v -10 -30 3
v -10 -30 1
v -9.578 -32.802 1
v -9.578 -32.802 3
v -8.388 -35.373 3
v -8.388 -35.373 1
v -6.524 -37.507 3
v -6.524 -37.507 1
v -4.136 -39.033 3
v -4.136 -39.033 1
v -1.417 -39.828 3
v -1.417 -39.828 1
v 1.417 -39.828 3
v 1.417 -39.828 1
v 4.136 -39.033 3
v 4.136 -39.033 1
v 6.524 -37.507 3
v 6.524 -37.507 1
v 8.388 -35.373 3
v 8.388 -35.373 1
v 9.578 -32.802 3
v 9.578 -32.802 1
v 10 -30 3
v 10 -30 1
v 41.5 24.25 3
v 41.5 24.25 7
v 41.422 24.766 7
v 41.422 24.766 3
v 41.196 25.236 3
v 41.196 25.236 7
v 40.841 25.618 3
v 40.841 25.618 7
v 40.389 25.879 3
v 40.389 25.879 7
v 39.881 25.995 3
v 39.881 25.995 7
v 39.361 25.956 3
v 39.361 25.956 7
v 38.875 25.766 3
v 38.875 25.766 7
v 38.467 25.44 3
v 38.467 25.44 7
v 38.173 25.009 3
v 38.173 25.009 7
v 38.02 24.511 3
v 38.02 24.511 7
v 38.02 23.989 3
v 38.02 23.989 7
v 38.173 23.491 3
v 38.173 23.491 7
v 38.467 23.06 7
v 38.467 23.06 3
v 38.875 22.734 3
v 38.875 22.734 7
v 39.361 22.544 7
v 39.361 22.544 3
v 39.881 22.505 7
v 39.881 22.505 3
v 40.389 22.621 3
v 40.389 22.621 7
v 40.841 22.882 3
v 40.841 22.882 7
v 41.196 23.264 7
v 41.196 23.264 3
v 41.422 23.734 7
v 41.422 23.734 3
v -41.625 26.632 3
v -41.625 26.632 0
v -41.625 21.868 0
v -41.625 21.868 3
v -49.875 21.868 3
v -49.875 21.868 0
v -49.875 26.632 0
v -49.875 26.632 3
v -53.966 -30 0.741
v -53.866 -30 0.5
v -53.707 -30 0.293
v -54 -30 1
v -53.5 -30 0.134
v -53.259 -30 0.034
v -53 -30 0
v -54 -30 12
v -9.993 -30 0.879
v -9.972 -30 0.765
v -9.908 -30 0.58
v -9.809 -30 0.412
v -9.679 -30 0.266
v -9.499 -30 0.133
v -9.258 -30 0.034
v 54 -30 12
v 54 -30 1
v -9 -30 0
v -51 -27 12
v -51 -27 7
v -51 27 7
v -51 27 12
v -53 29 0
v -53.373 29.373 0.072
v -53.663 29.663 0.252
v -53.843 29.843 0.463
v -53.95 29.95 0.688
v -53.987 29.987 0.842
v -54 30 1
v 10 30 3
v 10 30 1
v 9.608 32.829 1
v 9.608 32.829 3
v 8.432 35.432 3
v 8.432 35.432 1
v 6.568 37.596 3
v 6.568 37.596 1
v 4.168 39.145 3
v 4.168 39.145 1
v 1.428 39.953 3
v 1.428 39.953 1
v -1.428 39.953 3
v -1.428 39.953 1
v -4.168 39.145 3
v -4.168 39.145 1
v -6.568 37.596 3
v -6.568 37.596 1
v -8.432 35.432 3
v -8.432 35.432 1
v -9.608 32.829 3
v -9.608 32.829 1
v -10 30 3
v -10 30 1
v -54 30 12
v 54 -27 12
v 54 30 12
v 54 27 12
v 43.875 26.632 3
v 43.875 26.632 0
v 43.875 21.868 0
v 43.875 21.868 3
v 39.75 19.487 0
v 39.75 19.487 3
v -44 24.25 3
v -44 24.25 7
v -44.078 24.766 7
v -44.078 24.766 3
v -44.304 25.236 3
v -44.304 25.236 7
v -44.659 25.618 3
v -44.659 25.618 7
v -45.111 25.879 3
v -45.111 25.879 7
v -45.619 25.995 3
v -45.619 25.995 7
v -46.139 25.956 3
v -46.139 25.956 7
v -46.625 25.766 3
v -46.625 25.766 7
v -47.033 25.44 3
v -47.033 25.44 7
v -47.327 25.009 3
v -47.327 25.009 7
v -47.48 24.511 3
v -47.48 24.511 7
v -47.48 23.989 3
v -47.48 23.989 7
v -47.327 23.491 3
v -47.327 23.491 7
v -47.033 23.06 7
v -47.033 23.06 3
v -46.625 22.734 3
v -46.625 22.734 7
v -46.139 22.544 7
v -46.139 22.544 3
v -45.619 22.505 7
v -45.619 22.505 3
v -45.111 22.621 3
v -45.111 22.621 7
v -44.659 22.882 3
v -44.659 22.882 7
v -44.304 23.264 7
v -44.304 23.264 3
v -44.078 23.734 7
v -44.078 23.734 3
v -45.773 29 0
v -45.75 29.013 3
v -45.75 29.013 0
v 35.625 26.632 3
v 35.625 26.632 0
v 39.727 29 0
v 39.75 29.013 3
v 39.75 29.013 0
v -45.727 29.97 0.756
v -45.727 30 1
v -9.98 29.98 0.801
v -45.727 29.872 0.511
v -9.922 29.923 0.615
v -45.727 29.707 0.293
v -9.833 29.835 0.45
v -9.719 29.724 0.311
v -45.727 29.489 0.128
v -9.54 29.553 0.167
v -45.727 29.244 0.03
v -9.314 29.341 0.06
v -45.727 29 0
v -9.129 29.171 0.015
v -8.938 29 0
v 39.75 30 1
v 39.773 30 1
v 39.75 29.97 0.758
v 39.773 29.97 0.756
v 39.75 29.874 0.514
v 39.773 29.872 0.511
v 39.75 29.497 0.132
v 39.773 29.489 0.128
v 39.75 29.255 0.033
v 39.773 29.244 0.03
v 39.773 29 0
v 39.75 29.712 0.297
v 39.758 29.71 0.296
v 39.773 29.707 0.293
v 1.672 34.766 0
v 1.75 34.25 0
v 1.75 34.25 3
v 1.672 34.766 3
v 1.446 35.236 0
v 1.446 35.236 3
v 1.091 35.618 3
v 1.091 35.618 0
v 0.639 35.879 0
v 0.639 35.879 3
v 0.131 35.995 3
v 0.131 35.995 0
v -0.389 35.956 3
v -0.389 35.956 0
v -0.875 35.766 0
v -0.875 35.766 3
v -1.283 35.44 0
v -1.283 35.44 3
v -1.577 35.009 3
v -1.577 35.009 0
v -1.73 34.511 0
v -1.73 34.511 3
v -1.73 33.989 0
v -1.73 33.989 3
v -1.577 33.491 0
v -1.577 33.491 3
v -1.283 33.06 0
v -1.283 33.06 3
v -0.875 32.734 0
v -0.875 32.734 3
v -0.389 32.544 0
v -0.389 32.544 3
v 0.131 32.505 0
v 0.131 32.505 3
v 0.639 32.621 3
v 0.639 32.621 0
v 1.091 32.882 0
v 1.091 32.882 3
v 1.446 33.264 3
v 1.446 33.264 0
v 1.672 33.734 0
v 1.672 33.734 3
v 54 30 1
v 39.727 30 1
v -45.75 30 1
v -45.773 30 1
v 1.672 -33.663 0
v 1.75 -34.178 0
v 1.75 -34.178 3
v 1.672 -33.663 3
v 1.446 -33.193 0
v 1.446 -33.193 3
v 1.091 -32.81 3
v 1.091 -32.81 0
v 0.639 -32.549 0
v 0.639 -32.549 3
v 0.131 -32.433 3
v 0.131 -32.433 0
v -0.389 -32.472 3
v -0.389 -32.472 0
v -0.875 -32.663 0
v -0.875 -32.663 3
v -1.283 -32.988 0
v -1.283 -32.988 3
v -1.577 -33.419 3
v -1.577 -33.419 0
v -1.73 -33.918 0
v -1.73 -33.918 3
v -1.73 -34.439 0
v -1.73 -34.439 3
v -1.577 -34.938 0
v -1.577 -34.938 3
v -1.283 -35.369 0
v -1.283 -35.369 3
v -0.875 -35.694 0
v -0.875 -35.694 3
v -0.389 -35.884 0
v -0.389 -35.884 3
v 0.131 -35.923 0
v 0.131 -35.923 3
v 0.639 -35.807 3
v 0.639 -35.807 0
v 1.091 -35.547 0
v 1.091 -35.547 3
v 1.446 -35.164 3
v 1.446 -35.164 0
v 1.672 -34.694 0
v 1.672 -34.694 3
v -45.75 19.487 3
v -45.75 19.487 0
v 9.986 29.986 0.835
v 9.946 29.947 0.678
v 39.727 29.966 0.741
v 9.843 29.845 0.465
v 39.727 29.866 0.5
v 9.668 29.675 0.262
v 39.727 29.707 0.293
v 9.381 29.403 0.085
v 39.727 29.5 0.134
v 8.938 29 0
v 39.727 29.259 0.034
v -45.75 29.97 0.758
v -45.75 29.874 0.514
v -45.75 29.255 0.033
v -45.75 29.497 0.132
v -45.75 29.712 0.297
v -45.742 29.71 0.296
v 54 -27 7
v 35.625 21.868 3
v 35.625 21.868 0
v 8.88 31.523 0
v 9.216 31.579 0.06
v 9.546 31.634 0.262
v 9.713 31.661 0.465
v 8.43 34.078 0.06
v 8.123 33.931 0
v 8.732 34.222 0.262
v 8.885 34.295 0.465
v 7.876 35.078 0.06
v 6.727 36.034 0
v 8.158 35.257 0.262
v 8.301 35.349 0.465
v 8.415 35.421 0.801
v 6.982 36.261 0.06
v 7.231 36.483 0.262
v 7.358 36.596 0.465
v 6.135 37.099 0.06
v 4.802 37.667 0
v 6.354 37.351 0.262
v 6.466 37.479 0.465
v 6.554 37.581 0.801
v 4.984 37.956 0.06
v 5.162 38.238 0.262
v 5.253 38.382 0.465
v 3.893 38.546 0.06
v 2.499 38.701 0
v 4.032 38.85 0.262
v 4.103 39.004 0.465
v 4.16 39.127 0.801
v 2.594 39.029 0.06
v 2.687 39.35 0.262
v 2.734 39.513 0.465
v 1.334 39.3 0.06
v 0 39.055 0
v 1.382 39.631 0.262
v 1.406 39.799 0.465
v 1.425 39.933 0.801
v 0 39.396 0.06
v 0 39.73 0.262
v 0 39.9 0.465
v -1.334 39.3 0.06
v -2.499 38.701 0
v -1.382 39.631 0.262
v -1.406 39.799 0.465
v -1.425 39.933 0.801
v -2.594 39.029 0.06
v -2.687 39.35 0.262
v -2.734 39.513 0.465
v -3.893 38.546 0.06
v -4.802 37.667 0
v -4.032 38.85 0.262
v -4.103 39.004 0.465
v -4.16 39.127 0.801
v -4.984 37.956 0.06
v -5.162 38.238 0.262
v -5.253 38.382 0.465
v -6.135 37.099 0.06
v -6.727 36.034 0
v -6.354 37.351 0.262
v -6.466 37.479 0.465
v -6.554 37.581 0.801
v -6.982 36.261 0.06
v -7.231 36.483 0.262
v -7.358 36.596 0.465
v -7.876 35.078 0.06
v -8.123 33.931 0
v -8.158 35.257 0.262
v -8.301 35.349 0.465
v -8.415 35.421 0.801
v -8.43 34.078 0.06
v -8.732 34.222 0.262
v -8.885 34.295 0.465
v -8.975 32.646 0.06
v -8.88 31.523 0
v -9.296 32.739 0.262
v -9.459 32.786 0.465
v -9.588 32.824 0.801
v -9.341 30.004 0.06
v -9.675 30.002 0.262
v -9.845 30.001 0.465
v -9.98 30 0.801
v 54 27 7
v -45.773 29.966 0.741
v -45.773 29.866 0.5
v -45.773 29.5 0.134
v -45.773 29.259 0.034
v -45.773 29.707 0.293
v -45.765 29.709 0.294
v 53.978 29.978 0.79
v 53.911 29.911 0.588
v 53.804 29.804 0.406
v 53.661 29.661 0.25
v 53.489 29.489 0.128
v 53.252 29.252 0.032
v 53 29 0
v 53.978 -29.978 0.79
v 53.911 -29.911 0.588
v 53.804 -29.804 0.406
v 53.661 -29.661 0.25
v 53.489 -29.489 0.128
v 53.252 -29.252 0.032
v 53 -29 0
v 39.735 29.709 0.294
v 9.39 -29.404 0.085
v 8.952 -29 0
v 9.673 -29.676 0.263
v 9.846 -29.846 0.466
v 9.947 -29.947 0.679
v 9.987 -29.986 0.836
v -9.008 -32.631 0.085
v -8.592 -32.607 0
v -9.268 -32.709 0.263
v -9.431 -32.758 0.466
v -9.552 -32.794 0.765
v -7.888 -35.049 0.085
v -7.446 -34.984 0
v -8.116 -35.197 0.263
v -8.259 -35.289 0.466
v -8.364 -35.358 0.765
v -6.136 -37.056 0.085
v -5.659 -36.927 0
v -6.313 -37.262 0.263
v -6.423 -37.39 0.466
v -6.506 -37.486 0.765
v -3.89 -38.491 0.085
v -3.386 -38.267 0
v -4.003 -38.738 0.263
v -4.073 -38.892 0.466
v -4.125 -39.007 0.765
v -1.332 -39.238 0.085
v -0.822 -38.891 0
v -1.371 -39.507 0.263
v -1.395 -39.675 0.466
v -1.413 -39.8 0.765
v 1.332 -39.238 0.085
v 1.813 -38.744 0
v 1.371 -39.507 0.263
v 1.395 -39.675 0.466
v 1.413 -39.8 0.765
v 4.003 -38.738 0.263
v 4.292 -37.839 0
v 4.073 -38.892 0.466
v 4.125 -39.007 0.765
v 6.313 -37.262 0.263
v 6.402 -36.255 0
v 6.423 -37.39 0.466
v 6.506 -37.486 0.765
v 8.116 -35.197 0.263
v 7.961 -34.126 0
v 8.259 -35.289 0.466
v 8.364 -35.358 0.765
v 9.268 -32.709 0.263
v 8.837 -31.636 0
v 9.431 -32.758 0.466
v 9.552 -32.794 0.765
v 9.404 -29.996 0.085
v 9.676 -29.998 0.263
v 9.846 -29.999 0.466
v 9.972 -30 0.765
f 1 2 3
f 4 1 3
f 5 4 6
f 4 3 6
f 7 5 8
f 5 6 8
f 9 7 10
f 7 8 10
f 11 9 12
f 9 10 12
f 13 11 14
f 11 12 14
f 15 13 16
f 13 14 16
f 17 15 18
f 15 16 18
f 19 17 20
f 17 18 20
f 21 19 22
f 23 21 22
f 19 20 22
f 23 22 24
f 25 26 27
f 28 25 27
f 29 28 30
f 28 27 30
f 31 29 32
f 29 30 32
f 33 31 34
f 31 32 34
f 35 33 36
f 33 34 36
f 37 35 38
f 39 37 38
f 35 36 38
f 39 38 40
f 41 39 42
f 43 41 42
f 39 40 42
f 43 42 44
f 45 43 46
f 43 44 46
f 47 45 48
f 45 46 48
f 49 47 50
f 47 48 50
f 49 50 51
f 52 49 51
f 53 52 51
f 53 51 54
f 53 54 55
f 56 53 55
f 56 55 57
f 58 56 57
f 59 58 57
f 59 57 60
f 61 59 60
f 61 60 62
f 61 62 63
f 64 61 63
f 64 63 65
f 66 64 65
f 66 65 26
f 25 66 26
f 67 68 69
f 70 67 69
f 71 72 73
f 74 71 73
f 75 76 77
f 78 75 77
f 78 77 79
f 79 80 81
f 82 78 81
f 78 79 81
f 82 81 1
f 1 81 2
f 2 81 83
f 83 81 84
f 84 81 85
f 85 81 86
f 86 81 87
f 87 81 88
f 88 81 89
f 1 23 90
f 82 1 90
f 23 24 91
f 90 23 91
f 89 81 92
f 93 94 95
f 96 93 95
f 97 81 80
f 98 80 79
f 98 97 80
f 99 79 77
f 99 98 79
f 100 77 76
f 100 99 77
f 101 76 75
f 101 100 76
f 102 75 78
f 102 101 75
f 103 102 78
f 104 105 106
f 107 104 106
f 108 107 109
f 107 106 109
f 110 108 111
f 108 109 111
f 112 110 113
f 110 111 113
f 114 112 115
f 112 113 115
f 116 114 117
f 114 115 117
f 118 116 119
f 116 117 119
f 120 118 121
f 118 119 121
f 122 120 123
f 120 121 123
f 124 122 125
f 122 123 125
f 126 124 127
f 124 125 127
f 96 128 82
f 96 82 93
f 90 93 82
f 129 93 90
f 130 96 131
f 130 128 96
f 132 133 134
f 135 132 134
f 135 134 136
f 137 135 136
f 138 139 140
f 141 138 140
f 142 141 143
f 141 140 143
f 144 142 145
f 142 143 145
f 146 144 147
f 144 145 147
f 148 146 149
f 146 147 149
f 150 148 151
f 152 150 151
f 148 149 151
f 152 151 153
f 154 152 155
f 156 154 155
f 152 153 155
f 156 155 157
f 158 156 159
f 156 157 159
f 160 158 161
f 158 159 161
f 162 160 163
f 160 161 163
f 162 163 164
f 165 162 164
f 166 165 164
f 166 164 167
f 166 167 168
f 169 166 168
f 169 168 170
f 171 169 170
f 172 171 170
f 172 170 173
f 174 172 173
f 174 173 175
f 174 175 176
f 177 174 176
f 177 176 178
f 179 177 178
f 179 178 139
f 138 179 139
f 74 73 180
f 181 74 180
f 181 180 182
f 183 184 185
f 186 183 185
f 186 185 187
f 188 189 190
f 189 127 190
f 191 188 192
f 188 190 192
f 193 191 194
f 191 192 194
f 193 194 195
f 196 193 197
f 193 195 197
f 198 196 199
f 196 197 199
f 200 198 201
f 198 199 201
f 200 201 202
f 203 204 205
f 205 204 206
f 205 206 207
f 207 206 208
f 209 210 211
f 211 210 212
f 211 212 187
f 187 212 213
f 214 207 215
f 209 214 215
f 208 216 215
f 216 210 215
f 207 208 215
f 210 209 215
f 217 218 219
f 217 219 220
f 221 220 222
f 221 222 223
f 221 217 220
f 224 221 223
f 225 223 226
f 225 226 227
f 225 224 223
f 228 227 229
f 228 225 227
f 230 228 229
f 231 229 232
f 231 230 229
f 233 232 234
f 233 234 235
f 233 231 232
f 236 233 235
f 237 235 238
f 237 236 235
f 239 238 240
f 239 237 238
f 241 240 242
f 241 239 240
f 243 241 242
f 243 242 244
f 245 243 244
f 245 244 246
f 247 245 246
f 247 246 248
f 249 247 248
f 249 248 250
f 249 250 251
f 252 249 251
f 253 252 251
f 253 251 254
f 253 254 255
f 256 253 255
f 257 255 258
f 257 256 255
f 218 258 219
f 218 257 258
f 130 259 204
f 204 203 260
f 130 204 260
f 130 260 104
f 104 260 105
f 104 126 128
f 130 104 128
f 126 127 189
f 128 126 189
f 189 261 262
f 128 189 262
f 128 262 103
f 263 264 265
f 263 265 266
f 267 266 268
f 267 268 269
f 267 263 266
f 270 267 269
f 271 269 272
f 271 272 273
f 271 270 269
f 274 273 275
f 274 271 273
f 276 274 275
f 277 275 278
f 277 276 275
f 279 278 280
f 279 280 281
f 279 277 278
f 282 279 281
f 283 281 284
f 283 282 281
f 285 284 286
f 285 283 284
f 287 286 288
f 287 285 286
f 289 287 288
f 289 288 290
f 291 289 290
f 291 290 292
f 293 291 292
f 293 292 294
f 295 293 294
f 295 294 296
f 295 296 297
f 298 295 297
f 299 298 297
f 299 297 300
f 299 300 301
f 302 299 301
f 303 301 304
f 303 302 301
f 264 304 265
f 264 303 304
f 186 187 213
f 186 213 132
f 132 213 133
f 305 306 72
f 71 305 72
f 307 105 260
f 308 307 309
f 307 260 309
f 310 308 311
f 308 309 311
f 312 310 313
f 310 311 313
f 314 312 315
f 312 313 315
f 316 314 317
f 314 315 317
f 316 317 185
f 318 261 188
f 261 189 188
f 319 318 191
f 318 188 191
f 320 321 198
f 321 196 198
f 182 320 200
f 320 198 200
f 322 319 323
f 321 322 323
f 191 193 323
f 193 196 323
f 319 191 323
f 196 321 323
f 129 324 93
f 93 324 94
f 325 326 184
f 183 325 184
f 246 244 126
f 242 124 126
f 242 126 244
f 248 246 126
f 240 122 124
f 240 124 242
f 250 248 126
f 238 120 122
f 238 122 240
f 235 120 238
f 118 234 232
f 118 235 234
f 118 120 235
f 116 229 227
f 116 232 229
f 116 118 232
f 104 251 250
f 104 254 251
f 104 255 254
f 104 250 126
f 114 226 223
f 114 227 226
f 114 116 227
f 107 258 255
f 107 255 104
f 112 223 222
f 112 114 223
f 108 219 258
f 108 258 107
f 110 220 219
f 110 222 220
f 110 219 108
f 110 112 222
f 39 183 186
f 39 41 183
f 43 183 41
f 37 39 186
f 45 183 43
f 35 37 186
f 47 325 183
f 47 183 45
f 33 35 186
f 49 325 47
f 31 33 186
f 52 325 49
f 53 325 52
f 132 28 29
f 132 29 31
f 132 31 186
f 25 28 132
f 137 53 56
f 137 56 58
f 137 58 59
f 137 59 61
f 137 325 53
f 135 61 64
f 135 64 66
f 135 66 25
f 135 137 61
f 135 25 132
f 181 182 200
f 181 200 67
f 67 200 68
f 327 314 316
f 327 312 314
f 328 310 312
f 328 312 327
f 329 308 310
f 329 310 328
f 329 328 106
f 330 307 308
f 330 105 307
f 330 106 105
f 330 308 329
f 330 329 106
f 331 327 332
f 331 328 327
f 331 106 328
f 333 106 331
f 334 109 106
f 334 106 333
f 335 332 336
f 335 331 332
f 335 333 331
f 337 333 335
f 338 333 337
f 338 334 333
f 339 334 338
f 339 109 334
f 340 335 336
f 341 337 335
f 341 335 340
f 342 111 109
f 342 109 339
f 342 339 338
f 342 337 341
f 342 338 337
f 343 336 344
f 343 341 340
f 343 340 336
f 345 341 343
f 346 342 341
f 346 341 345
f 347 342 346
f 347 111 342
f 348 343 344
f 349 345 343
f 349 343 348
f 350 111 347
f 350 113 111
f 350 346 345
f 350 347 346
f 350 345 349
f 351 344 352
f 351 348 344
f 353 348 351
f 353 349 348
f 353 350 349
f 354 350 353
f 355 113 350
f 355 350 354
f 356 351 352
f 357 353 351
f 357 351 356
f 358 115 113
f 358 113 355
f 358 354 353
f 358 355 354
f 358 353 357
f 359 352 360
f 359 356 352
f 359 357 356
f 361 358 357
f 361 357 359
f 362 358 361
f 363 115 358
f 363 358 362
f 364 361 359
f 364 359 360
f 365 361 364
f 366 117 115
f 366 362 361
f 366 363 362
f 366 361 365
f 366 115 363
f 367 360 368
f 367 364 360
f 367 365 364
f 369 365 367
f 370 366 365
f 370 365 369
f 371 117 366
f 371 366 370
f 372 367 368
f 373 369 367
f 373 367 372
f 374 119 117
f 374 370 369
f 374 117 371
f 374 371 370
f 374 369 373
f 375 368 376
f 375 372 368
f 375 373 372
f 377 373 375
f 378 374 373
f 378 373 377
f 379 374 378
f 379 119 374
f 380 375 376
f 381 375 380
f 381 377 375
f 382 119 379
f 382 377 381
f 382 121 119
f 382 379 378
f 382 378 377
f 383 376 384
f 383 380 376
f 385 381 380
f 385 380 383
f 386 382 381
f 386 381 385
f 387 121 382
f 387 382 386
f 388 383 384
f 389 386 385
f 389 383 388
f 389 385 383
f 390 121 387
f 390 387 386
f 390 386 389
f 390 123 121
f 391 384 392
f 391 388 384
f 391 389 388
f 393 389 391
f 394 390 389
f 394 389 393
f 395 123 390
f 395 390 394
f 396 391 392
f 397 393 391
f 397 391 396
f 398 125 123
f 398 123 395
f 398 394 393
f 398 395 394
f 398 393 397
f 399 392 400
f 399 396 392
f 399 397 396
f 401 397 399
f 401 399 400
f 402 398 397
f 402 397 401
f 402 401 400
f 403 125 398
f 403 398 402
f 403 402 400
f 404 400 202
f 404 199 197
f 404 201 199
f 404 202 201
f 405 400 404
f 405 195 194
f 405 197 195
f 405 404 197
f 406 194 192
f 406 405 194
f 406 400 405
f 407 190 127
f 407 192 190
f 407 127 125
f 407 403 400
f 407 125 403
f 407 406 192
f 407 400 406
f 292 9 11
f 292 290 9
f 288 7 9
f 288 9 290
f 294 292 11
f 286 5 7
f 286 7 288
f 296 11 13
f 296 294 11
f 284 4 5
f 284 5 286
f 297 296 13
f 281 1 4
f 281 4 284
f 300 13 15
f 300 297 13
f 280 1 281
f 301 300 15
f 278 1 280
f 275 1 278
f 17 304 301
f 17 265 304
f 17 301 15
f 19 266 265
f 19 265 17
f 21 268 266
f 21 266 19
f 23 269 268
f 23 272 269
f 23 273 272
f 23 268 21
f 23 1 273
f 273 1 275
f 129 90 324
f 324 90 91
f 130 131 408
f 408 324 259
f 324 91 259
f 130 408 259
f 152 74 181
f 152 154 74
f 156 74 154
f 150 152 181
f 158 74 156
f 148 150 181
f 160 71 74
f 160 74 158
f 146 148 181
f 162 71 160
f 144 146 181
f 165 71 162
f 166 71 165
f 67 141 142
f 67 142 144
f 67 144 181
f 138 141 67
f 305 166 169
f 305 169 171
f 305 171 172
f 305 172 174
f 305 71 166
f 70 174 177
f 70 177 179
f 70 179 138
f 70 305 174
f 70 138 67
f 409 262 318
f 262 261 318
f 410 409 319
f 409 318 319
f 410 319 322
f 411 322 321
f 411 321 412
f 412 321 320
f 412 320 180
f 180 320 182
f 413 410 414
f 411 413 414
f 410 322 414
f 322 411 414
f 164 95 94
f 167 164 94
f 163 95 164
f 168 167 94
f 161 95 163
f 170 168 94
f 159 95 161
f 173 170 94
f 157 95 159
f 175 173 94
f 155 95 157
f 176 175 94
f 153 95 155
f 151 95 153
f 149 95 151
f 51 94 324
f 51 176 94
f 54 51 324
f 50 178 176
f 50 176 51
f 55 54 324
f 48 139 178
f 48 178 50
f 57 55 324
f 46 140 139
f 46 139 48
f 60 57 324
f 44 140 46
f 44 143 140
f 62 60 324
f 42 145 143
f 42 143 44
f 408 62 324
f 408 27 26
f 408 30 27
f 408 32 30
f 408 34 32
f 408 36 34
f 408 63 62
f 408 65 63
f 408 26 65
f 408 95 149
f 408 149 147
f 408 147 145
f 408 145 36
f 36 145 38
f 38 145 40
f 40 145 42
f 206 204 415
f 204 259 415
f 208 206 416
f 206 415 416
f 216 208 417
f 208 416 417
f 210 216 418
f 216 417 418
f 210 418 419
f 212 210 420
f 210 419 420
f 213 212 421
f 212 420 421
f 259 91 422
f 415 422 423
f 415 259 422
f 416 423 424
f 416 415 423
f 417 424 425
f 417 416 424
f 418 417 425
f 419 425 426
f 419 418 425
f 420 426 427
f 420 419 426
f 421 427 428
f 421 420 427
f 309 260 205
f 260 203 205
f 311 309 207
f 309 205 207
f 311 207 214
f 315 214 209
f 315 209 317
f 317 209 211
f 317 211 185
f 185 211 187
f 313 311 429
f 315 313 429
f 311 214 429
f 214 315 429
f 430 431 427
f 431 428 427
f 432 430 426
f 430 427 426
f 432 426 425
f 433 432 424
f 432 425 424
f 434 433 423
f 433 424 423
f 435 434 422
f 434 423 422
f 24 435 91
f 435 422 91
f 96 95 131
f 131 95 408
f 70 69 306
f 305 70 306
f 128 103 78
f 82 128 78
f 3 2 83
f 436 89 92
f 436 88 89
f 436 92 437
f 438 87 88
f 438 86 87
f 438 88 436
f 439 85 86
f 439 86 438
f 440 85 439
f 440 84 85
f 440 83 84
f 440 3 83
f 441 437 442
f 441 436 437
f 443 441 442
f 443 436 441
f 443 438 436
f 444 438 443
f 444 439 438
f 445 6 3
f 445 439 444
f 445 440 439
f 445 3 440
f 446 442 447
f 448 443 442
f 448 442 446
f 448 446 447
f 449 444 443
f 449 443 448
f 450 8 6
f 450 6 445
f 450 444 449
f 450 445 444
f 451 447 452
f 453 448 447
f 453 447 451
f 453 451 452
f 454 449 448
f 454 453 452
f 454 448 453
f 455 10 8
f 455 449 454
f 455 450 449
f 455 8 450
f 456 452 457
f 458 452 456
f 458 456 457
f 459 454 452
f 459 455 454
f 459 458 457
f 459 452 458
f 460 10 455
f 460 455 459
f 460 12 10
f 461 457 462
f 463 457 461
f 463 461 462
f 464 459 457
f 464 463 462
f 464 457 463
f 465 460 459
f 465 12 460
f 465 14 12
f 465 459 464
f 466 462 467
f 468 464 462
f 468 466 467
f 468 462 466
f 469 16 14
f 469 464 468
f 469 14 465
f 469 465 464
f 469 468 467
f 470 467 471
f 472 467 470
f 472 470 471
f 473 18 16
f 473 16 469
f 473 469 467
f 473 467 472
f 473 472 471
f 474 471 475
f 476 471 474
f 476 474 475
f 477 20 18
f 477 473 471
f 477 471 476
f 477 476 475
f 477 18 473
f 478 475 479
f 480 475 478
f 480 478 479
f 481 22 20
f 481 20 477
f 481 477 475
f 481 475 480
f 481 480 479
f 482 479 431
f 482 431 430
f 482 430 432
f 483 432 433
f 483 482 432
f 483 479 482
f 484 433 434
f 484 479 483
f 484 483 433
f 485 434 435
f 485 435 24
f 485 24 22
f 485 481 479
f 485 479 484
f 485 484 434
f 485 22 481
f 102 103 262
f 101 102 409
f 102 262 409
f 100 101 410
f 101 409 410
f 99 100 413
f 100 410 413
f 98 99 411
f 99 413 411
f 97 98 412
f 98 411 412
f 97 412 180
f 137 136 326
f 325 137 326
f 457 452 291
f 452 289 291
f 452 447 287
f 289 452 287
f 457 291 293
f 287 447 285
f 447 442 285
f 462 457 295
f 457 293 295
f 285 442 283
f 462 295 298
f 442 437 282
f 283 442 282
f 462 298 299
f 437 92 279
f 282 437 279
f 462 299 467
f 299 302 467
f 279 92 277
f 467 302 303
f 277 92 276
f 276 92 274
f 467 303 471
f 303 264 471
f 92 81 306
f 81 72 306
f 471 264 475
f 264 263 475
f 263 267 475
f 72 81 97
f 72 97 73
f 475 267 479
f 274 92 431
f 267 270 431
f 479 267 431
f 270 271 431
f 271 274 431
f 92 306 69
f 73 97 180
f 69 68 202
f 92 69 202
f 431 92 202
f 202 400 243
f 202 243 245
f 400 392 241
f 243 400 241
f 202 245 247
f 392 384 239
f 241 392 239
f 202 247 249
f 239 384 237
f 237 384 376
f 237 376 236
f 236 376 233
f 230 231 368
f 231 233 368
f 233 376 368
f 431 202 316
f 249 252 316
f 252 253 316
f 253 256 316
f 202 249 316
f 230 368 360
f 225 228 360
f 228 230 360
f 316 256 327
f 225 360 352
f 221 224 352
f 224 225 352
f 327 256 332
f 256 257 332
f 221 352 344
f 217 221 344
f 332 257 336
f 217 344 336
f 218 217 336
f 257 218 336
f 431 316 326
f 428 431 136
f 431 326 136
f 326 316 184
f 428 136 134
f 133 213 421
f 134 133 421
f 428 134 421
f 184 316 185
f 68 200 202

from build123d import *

# Parameters (mm, degrees)
F0_W     = 108
F0_H     = 60
F1_DEPTH = 7
F3_DEPTH = 5
F4_R     = 1.75
F5_DEPTH = 7.001
F7_DEPTH = 3
F8_R     = 1.75
F9_DEPTH = 3
F10_R    = 1


with BuildPart() as f1:
    # F0 (on Top) → F1 (new body)
    with BuildSketch(Plane.XY):
        Rectangle(F0_W, F0_H)
    extrude(amount=F1_DEPTH)

    # F2 (on face) → F3 (join)
    with BuildSketch(Plane.XY.offset(7)):
        Polygon((54, 30), (-54, 30), (-54, -30), (54, -30), (54, -27), (51, -27), (-51, -27), (-51, 27), (51, 27), (54, 27), align=None)
    extrude(amount=F3_DEPTH)

    # F4 (on face) → F5 (cut, through all)
    with BuildSketch(Plane.XY.offset(7)):
        with Locations((-45.75, 24.25)):
            Circle(F4_R)
        with Locations((39.75, 24.25)):
            Circle(F4_R)
    extrude(amount=-F5_DEPTH, mode=Mode.SUBTRACT)

    # F6 (on face) → F7 (cut)
    with BuildSketch(Plane(origin=(0, 0, 0), x_dir=(1, 0, 0), z_dir=(0, 0, -1))):
        Polygon((35.625, -21.8684301396), (35.625, -26.6315698604), (39.75, -29.0131397208), (43.875, -26.6315698604), (43.875, -21.8684301396), (39.75, -19.4868602792), align=None)
        Polygon((-49.875, -21.8684301396), (-49.875, -26.6315698604), (-45.75, -29.0131397208), (-41.625, -26.6315698604), (-41.625, -21.8684301396), (-45.75, -19.4868602792), align=None)
    extrude(amount=-F7_DEPTH, mode=Mode.SUBTRACT)

    # F8 (on Top) → F9 (join)
    with BuildSketch(Plane.XY):
        with BuildLine():
            Line((10, -30), (-10, -30))
            ThreePointArc((-10, -30), (0, -39.928586731), (10, -30))
        make_face()
        with Locations((0, -34.1783299042)):
            Circle(F8_R, mode=Mode.SUBTRACT)
        with BuildLine():
            Line((-10, 30), (10, 30))
            ThreePointArc((10, 30), (0, 40.0551036455), (-10, 30))
        make_face()
        with Locations((0, 34.25)):
            Circle(F8_R, mode=Mode.SUBTRACT)
    extrude(amount=F9_DEPTH)

    # F10
    f10_edges = [f1.edges().sort_by_distance(p)[0] for p in [
        (54, 0, 0),
        (32, -30, 0),
        (0, -39.928587, 0),
        (-54, 0, 0),
        (-32, 30, 0),
        (0, 40.055104, 0),
        (32, 30, 0),
    ]]
    fillet(f10_edges, radius=F10_R)


solid = f1.part
